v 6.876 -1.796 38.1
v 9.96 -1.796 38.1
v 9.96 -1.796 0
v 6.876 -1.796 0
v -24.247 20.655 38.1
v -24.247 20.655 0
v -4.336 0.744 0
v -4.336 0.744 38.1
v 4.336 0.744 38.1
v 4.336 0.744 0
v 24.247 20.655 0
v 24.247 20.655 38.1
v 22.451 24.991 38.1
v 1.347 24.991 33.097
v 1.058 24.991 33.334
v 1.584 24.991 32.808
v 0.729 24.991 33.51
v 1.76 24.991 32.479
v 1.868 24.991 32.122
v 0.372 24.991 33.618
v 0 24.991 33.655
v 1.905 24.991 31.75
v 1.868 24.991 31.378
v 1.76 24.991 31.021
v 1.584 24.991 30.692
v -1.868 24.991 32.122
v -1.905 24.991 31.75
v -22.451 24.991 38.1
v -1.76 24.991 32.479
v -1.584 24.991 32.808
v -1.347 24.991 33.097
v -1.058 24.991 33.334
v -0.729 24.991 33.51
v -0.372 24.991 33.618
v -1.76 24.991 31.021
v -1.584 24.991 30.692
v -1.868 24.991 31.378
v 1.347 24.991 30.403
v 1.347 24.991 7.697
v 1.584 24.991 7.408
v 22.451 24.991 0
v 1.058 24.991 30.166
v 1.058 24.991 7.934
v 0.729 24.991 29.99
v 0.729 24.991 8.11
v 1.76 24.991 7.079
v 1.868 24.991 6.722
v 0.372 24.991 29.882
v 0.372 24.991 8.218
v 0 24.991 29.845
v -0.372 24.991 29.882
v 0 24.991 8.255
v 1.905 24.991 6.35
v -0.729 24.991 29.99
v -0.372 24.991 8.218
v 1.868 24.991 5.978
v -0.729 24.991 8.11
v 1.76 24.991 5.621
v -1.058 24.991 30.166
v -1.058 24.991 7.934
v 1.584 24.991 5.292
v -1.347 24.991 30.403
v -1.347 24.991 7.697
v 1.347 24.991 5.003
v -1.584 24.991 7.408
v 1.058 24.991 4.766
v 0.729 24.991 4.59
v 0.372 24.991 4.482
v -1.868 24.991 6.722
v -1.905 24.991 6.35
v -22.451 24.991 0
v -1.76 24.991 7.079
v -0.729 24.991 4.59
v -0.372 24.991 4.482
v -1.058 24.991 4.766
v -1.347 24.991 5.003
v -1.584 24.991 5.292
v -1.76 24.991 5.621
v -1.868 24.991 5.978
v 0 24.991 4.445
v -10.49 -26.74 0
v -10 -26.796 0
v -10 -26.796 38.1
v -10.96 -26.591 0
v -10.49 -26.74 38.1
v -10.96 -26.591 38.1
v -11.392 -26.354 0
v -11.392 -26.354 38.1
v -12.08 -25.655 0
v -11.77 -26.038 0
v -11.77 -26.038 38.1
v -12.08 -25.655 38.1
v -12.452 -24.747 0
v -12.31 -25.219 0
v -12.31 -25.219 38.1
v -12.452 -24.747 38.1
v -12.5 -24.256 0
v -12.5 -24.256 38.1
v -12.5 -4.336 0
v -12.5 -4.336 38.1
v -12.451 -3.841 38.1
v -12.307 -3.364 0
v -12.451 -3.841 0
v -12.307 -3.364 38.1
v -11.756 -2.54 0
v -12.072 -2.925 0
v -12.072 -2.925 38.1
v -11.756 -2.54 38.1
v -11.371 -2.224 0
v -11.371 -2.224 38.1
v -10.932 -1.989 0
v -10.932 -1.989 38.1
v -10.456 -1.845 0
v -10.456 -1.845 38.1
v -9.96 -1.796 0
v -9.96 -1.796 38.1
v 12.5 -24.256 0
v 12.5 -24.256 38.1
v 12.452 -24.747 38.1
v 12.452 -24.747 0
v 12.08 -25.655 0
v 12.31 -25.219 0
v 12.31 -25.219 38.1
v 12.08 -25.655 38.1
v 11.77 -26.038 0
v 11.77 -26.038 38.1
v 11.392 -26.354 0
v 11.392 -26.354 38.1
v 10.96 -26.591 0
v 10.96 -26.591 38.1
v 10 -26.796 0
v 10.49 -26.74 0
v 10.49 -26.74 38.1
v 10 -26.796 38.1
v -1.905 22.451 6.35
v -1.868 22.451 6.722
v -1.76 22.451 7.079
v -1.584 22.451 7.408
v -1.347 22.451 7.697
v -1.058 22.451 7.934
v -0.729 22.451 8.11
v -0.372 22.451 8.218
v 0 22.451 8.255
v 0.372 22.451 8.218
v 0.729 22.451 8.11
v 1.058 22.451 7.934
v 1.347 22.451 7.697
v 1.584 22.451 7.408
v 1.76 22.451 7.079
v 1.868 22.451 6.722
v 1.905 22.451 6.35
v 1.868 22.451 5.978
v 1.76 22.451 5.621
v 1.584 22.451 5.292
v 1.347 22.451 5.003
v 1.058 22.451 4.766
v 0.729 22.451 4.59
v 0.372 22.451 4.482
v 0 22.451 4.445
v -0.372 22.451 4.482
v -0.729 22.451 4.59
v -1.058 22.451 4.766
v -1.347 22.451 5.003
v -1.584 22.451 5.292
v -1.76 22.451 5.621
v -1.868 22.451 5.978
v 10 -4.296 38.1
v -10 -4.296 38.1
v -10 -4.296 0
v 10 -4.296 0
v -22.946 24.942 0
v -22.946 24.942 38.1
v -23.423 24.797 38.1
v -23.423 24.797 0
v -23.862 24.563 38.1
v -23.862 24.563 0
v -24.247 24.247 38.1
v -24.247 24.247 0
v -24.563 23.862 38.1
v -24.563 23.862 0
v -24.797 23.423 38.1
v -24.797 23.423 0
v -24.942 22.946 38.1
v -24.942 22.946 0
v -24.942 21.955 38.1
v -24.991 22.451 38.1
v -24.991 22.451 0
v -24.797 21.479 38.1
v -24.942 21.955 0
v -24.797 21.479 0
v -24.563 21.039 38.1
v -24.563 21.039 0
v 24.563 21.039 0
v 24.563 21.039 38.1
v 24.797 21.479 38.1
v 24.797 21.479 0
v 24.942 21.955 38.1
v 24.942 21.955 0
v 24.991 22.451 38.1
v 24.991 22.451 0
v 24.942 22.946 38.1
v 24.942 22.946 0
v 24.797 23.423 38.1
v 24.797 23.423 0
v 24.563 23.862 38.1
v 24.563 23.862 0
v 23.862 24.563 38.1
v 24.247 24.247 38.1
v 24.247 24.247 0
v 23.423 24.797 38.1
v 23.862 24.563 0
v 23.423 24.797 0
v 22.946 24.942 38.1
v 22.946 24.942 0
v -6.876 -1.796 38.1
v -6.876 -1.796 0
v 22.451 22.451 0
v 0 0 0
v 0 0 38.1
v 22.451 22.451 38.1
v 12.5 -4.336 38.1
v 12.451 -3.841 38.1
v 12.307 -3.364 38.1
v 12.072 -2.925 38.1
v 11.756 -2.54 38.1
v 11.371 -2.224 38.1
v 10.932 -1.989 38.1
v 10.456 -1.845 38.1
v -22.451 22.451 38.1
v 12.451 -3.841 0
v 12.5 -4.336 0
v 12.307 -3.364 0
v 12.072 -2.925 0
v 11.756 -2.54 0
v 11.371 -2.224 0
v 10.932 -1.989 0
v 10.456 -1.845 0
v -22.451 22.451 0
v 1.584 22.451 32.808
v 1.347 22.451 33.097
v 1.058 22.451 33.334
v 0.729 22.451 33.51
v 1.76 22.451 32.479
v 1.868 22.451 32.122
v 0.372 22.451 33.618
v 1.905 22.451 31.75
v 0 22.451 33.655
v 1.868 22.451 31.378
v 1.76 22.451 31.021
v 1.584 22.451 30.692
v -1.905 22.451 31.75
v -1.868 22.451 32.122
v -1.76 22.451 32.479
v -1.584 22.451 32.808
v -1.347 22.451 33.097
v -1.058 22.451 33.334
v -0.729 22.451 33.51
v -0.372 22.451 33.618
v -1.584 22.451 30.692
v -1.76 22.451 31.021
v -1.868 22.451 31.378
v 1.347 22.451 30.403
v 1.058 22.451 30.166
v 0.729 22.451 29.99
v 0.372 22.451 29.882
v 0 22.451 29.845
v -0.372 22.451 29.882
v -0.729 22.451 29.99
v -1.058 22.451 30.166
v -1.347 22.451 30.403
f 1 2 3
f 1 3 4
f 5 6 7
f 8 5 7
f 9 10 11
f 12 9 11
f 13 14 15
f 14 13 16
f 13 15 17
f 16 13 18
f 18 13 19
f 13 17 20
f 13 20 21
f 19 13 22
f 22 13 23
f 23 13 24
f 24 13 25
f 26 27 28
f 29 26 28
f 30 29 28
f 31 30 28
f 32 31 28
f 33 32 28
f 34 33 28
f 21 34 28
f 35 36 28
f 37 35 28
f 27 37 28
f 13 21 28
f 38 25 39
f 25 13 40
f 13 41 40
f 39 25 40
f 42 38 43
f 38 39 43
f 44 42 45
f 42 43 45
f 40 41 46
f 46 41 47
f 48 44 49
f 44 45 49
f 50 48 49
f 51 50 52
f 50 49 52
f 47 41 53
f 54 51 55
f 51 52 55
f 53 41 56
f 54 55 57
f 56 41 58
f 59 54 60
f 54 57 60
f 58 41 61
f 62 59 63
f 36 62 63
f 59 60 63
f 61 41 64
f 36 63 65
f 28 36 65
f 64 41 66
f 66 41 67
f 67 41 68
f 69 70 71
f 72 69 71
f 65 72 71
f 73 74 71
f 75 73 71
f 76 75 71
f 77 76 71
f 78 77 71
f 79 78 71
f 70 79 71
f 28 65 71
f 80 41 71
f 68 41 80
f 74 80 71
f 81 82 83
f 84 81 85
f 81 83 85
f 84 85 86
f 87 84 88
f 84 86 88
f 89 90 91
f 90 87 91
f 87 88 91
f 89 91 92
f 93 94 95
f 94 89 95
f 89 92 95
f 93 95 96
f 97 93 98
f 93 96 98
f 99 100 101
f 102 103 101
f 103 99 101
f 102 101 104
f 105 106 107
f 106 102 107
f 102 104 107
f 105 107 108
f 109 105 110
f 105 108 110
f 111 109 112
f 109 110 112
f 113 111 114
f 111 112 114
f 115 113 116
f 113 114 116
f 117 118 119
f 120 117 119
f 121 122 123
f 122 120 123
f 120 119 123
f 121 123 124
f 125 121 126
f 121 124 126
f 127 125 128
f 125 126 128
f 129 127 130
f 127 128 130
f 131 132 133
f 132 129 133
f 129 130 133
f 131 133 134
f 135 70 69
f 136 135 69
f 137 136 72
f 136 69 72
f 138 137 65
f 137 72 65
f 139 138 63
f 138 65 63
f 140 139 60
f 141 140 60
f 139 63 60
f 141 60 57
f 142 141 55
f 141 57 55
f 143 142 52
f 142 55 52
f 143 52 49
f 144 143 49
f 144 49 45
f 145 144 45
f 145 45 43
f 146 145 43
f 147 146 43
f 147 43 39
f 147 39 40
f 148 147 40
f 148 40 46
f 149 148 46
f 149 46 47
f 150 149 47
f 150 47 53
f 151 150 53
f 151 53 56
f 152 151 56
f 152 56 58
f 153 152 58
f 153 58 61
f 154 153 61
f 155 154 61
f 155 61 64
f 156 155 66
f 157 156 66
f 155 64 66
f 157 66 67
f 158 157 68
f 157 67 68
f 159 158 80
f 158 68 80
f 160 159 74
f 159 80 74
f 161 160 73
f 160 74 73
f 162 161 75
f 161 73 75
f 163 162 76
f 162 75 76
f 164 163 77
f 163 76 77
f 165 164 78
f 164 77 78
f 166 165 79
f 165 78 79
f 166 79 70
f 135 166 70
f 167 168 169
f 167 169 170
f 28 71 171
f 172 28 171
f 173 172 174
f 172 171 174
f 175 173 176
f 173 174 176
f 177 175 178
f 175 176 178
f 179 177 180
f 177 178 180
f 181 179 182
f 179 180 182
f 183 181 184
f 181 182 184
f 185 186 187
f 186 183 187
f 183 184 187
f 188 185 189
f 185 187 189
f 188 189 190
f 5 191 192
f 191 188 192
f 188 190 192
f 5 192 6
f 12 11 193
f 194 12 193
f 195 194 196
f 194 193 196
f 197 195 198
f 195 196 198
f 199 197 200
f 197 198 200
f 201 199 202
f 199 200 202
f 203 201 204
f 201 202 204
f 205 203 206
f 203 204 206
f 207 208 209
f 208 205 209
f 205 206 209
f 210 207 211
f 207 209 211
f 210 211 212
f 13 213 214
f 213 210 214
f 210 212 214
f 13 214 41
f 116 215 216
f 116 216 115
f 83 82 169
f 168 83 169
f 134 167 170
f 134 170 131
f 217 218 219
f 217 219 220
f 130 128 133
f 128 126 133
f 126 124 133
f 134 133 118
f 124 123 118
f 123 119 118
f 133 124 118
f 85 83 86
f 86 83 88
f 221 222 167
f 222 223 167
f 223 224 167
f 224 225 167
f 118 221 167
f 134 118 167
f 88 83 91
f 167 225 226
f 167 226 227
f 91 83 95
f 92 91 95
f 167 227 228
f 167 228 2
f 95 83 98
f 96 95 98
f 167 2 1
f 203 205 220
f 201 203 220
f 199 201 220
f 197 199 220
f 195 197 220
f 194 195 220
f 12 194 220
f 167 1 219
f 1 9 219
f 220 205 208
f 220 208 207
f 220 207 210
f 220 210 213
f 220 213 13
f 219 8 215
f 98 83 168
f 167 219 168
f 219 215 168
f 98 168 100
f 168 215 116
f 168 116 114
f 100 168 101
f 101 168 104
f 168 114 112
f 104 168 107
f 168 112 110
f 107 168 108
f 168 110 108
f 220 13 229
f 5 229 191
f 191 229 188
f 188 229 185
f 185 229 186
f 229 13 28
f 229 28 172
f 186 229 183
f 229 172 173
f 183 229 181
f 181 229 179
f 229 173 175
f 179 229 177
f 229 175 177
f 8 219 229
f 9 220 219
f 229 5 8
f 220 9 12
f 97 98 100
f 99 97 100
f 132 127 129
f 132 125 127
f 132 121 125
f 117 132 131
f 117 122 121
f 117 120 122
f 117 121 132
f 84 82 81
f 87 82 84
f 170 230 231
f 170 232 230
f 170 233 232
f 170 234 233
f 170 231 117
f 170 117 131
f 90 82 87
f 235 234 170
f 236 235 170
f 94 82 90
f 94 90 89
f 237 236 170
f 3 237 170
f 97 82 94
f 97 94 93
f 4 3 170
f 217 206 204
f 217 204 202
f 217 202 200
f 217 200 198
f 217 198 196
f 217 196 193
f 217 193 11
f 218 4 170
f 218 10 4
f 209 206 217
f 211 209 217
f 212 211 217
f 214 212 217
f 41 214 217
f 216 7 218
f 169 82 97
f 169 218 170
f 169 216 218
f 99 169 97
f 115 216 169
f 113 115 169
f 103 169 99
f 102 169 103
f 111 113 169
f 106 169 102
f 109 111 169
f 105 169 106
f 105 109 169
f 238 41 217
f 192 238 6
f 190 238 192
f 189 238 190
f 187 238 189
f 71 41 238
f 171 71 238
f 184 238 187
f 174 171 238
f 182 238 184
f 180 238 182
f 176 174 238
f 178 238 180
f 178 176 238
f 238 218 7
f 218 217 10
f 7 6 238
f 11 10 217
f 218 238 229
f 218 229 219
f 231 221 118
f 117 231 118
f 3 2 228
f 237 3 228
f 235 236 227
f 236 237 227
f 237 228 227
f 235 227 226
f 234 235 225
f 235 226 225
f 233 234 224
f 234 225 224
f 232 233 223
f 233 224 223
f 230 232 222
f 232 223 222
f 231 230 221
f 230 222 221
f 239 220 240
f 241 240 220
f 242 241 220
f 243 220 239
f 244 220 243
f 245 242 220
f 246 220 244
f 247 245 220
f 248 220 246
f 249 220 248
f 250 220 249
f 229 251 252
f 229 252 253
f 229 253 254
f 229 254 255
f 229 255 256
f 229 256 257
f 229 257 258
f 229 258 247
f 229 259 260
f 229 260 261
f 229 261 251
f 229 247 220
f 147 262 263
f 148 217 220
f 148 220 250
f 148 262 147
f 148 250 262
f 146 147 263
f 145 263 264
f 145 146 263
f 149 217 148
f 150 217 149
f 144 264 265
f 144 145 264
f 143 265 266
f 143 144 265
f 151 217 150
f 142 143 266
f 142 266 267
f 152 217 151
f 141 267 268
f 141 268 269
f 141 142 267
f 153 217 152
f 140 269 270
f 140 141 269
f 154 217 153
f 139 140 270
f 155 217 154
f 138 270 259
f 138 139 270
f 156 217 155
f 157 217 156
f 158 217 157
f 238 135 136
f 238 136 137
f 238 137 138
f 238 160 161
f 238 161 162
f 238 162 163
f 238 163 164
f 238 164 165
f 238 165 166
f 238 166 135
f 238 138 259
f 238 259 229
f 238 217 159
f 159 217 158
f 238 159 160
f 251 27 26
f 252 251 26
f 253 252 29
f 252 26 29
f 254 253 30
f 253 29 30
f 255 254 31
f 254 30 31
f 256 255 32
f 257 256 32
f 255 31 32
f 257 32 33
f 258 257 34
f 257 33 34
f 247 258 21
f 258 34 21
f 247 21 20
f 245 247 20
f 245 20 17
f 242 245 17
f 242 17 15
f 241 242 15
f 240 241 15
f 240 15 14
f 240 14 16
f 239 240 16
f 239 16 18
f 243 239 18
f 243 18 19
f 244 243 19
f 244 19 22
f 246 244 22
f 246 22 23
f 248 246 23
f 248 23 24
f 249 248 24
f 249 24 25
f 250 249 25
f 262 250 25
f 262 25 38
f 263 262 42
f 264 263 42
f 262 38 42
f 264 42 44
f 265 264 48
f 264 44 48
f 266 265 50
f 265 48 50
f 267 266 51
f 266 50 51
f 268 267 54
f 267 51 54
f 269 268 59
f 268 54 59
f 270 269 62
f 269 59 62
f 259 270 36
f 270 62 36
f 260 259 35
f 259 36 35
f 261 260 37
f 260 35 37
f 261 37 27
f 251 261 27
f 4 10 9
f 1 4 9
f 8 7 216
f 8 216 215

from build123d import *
from OCP.BRepFilletAPI import BRepFilletAPI_MakeChamfer

# Parameters (mm, degrees)
BOSS_EXTRUDE1_DEPTH = 38.1
CHAMFER1_SIZE       = 2.54
BOSS_EXTRUDE2_DEPTH = 38.1
CHAMFER2_SIZE       = 5.08
CHAMFER2_SIZE2      = 3.592102448
FILLET1_R           = 2.54
CUT_EXTRUDE1_REACH  = 70.978
SKETCH3_R           = 1.905


with BuildPart() as part:
    # Sketch1 → Boss-Extrude1 (new body)
    with BuildSketch(Plane.XY):
        Polygon((0, -3.592102448), (28.582742751, 24.990640303), (-28.582742751, 24.990640303), align=None)
        Polygon((0, 0), (22.450640303, 22.450640303), (-22.450640303, 22.450640303), align=None, mode=Mode.SUBTRACT)
    extrude(amount=BOSS_EXTRUDE1_DEPTH)

    # Chamfer1
    chamfer1_edges = [part.edges().sort_by_distance(p)[0] for p in [
        (0, -3.592102448, 19.05),
    ]]
    chamfer(chamfer1_edges, length=CHAMFER1_SIZE)

    # Sketch2 → Boss-Extrude2 (add)
    with BuildSketch(Plane.XY.offset(38.1)):
        Polygon((0, -1.796051224), (12.5, -1.796051224), (12.5, -26.796051224), (10, -26.796051224), (10, -24.296051224), (10, -4.296051224), (0, -4.296051224), (-10, -4.296051224), (-10, -24.296051224), (-10, -26.796051224), (-12.5, -26.796051224), (-12.5, -1.796051224), align=None)
    extrude(amount=-BOSS_EXTRUDE2_DEPTH)

    # Chamfer2: one chamfer whose edges measure the first distance from different faces: ONE call of the kernel's chamfer builder (chamfer() names one face for all edges)
    chamfer2_edges_1 = [part.edges().sort_by_distance(p)[0] for p in [
        (-1.796051224, -1.796051224, 19.05),
    ]]
    chamfer2_side_1 = [part.faces().sort_by_distance(p)[0] for p in [
        (-7.148025612, -1.796051224, 19.05),
    ]]
    chamfer2_edges_2 = [part.edges().sort_by_distance(p)[0] for p in [
        (1.796051224, -1.796051224, 19.05),
    ]]
    chamfer2_side_2 = [part.faces().sort_by_distance(p)[0] for p in [
        (7.148025612, -1.796051224, 19.05),
    ]]
    chamfer2 = BRepFilletAPI_MakeChamfer(part.part.solid().wrapped)
    for e in chamfer2_edges_1:
        chamfer2.Add(CHAMFER2_SIZE, CHAMFER2_SIZE2, e.wrapped, chamfer2_side_1[0].wrapped)  # the first distance lies on this face
    for e in chamfer2_edges_2:
        chamfer2.Add(CHAMFER2_SIZE, CHAMFER2_SIZE2, e.wrapped, chamfer2_side_2[0].wrapped)  # the first distance lies on this face
    add(Compound.cast(chamfer2.Shape()), mode=Mode.REPLACE)

    # Fillet1
    # the kernel refuses this fillet: 2.54 mm, written as the material it takes off along each edge
    with BuildSketch(Plane(origin=(-12.5, -26.796051224, 44.45), x_dir=(1, 0, 0), z_dir=(0, 0, -1)), Plane(origin=(12.5, -1.796051224, 44.45), x_dir=(-1, 0, 0), z_dir=(0, 0, -1)), Plane(origin=(12.5, -26.796051224, 44.45), x_dir=(0, 1, 0), z_dir=(0, 0, -1))) as fillet1_piece_1:
        with BuildLine():
            CenterArc((FILLET1_R, -FILLET1_R), FILLET1_R, 90, 90)
            Line((0, -FILLET1_R), (0, 0))
            Line((0, 0), (FILLET1_R, 0))
        make_face()
    extrude(amount=50.8, mode=Mode.SUBTRACT)
    with BuildSketch(Plane(origin=(-12.5, -1.796051224, 44.45), x_dir=(1, 0, 0), z_dir=(0, 0, -1))) as fillet1_piece_2:
        with BuildLine():
            CenterArc((FILLET1_R, FILLET1_R), FILLET1_R, 180, 90)
            Line((0, FILLET1_R), (0, 0))
            Line((0, 0), (FILLET1_R, 0))
        make_face()
    extrude(amount=50.8, mode=Mode.SUBTRACT)
    with BuildSketch(Plane(origin=(-28.582742751, 24.990640303, -15.330256121), x_dir=(1, 0, 0), z_dir=(0, 0, 1)), Plane(origin=(28.582742751, 24.990640303, -15.330256121), x_dir=(-0.7071067811865476, -0.7071067811865476, 0), z_dir=(0, 0, 1))) as fillet1_piece_3:
        with BuildLine():
            CenterArc((FILLET1_R * 2.41421356237, -FILLET1_R), FILLET1_R, 90, 135)
            Line((FILLET1_R * 1.70710678119, -FILLET1_R * 1.70710678119), (0, 0))
            Line((0, 0), (FILLET1_R * 2.41421356237, 0))
        make_face()
    extrude(amount=68.760512242, mode=Mode.SUBTRACT)

    # Sketch3 → Cut-Extrude1 (cut, up to next)
    with BuildSketch(Plane(origin=(0, 24.990640303, 0), x_dir=(1, 0, 0), z_dir=(0, 1, 0)), mode=Mode.PRIVATE) as cut_extrude1_sk1:
        with Locations(Location((0, -31.75, 0), (0, 0, 180))):
            Circle(SKETCH3_R)
    cut_extrude1_tool1 = extrude(cut_extrude1_sk1.sketch, amount=-CUT_EXTRUDE1_REACH, mode=Mode.PRIVATE) & part.part
    # Sketch3 → Cut-Extrude1 (cut, up to next)
    with BuildSketch(Plane(origin=(0, 24.990640303, 0), x_dir=(1, 0, 0), z_dir=(0, 1, 0)), mode=Mode.PRIVATE) as cut_extrude1_sk2:
        with Locations(Location((0, -6.35, 0), (0, 0, 180))):
            Circle(SKETCH3_R)
    cut_extrude1_tool2 = extrude(cut_extrude1_sk2.sketch, amount=-CUT_EXTRUDE1_REACH, mode=Mode.PRIVATE) & part.part
    add(cut_extrude1_tool1.solids().sort_by_distance((0, 24.99064, 31.75))[0], mode=Mode.SUBTRACT)
    add(cut_extrude1_tool2.solids().sort_by_distance((0, 24.99064, 6.35))[0], mode=Mode.SUBTRACT)


solid = part.part
